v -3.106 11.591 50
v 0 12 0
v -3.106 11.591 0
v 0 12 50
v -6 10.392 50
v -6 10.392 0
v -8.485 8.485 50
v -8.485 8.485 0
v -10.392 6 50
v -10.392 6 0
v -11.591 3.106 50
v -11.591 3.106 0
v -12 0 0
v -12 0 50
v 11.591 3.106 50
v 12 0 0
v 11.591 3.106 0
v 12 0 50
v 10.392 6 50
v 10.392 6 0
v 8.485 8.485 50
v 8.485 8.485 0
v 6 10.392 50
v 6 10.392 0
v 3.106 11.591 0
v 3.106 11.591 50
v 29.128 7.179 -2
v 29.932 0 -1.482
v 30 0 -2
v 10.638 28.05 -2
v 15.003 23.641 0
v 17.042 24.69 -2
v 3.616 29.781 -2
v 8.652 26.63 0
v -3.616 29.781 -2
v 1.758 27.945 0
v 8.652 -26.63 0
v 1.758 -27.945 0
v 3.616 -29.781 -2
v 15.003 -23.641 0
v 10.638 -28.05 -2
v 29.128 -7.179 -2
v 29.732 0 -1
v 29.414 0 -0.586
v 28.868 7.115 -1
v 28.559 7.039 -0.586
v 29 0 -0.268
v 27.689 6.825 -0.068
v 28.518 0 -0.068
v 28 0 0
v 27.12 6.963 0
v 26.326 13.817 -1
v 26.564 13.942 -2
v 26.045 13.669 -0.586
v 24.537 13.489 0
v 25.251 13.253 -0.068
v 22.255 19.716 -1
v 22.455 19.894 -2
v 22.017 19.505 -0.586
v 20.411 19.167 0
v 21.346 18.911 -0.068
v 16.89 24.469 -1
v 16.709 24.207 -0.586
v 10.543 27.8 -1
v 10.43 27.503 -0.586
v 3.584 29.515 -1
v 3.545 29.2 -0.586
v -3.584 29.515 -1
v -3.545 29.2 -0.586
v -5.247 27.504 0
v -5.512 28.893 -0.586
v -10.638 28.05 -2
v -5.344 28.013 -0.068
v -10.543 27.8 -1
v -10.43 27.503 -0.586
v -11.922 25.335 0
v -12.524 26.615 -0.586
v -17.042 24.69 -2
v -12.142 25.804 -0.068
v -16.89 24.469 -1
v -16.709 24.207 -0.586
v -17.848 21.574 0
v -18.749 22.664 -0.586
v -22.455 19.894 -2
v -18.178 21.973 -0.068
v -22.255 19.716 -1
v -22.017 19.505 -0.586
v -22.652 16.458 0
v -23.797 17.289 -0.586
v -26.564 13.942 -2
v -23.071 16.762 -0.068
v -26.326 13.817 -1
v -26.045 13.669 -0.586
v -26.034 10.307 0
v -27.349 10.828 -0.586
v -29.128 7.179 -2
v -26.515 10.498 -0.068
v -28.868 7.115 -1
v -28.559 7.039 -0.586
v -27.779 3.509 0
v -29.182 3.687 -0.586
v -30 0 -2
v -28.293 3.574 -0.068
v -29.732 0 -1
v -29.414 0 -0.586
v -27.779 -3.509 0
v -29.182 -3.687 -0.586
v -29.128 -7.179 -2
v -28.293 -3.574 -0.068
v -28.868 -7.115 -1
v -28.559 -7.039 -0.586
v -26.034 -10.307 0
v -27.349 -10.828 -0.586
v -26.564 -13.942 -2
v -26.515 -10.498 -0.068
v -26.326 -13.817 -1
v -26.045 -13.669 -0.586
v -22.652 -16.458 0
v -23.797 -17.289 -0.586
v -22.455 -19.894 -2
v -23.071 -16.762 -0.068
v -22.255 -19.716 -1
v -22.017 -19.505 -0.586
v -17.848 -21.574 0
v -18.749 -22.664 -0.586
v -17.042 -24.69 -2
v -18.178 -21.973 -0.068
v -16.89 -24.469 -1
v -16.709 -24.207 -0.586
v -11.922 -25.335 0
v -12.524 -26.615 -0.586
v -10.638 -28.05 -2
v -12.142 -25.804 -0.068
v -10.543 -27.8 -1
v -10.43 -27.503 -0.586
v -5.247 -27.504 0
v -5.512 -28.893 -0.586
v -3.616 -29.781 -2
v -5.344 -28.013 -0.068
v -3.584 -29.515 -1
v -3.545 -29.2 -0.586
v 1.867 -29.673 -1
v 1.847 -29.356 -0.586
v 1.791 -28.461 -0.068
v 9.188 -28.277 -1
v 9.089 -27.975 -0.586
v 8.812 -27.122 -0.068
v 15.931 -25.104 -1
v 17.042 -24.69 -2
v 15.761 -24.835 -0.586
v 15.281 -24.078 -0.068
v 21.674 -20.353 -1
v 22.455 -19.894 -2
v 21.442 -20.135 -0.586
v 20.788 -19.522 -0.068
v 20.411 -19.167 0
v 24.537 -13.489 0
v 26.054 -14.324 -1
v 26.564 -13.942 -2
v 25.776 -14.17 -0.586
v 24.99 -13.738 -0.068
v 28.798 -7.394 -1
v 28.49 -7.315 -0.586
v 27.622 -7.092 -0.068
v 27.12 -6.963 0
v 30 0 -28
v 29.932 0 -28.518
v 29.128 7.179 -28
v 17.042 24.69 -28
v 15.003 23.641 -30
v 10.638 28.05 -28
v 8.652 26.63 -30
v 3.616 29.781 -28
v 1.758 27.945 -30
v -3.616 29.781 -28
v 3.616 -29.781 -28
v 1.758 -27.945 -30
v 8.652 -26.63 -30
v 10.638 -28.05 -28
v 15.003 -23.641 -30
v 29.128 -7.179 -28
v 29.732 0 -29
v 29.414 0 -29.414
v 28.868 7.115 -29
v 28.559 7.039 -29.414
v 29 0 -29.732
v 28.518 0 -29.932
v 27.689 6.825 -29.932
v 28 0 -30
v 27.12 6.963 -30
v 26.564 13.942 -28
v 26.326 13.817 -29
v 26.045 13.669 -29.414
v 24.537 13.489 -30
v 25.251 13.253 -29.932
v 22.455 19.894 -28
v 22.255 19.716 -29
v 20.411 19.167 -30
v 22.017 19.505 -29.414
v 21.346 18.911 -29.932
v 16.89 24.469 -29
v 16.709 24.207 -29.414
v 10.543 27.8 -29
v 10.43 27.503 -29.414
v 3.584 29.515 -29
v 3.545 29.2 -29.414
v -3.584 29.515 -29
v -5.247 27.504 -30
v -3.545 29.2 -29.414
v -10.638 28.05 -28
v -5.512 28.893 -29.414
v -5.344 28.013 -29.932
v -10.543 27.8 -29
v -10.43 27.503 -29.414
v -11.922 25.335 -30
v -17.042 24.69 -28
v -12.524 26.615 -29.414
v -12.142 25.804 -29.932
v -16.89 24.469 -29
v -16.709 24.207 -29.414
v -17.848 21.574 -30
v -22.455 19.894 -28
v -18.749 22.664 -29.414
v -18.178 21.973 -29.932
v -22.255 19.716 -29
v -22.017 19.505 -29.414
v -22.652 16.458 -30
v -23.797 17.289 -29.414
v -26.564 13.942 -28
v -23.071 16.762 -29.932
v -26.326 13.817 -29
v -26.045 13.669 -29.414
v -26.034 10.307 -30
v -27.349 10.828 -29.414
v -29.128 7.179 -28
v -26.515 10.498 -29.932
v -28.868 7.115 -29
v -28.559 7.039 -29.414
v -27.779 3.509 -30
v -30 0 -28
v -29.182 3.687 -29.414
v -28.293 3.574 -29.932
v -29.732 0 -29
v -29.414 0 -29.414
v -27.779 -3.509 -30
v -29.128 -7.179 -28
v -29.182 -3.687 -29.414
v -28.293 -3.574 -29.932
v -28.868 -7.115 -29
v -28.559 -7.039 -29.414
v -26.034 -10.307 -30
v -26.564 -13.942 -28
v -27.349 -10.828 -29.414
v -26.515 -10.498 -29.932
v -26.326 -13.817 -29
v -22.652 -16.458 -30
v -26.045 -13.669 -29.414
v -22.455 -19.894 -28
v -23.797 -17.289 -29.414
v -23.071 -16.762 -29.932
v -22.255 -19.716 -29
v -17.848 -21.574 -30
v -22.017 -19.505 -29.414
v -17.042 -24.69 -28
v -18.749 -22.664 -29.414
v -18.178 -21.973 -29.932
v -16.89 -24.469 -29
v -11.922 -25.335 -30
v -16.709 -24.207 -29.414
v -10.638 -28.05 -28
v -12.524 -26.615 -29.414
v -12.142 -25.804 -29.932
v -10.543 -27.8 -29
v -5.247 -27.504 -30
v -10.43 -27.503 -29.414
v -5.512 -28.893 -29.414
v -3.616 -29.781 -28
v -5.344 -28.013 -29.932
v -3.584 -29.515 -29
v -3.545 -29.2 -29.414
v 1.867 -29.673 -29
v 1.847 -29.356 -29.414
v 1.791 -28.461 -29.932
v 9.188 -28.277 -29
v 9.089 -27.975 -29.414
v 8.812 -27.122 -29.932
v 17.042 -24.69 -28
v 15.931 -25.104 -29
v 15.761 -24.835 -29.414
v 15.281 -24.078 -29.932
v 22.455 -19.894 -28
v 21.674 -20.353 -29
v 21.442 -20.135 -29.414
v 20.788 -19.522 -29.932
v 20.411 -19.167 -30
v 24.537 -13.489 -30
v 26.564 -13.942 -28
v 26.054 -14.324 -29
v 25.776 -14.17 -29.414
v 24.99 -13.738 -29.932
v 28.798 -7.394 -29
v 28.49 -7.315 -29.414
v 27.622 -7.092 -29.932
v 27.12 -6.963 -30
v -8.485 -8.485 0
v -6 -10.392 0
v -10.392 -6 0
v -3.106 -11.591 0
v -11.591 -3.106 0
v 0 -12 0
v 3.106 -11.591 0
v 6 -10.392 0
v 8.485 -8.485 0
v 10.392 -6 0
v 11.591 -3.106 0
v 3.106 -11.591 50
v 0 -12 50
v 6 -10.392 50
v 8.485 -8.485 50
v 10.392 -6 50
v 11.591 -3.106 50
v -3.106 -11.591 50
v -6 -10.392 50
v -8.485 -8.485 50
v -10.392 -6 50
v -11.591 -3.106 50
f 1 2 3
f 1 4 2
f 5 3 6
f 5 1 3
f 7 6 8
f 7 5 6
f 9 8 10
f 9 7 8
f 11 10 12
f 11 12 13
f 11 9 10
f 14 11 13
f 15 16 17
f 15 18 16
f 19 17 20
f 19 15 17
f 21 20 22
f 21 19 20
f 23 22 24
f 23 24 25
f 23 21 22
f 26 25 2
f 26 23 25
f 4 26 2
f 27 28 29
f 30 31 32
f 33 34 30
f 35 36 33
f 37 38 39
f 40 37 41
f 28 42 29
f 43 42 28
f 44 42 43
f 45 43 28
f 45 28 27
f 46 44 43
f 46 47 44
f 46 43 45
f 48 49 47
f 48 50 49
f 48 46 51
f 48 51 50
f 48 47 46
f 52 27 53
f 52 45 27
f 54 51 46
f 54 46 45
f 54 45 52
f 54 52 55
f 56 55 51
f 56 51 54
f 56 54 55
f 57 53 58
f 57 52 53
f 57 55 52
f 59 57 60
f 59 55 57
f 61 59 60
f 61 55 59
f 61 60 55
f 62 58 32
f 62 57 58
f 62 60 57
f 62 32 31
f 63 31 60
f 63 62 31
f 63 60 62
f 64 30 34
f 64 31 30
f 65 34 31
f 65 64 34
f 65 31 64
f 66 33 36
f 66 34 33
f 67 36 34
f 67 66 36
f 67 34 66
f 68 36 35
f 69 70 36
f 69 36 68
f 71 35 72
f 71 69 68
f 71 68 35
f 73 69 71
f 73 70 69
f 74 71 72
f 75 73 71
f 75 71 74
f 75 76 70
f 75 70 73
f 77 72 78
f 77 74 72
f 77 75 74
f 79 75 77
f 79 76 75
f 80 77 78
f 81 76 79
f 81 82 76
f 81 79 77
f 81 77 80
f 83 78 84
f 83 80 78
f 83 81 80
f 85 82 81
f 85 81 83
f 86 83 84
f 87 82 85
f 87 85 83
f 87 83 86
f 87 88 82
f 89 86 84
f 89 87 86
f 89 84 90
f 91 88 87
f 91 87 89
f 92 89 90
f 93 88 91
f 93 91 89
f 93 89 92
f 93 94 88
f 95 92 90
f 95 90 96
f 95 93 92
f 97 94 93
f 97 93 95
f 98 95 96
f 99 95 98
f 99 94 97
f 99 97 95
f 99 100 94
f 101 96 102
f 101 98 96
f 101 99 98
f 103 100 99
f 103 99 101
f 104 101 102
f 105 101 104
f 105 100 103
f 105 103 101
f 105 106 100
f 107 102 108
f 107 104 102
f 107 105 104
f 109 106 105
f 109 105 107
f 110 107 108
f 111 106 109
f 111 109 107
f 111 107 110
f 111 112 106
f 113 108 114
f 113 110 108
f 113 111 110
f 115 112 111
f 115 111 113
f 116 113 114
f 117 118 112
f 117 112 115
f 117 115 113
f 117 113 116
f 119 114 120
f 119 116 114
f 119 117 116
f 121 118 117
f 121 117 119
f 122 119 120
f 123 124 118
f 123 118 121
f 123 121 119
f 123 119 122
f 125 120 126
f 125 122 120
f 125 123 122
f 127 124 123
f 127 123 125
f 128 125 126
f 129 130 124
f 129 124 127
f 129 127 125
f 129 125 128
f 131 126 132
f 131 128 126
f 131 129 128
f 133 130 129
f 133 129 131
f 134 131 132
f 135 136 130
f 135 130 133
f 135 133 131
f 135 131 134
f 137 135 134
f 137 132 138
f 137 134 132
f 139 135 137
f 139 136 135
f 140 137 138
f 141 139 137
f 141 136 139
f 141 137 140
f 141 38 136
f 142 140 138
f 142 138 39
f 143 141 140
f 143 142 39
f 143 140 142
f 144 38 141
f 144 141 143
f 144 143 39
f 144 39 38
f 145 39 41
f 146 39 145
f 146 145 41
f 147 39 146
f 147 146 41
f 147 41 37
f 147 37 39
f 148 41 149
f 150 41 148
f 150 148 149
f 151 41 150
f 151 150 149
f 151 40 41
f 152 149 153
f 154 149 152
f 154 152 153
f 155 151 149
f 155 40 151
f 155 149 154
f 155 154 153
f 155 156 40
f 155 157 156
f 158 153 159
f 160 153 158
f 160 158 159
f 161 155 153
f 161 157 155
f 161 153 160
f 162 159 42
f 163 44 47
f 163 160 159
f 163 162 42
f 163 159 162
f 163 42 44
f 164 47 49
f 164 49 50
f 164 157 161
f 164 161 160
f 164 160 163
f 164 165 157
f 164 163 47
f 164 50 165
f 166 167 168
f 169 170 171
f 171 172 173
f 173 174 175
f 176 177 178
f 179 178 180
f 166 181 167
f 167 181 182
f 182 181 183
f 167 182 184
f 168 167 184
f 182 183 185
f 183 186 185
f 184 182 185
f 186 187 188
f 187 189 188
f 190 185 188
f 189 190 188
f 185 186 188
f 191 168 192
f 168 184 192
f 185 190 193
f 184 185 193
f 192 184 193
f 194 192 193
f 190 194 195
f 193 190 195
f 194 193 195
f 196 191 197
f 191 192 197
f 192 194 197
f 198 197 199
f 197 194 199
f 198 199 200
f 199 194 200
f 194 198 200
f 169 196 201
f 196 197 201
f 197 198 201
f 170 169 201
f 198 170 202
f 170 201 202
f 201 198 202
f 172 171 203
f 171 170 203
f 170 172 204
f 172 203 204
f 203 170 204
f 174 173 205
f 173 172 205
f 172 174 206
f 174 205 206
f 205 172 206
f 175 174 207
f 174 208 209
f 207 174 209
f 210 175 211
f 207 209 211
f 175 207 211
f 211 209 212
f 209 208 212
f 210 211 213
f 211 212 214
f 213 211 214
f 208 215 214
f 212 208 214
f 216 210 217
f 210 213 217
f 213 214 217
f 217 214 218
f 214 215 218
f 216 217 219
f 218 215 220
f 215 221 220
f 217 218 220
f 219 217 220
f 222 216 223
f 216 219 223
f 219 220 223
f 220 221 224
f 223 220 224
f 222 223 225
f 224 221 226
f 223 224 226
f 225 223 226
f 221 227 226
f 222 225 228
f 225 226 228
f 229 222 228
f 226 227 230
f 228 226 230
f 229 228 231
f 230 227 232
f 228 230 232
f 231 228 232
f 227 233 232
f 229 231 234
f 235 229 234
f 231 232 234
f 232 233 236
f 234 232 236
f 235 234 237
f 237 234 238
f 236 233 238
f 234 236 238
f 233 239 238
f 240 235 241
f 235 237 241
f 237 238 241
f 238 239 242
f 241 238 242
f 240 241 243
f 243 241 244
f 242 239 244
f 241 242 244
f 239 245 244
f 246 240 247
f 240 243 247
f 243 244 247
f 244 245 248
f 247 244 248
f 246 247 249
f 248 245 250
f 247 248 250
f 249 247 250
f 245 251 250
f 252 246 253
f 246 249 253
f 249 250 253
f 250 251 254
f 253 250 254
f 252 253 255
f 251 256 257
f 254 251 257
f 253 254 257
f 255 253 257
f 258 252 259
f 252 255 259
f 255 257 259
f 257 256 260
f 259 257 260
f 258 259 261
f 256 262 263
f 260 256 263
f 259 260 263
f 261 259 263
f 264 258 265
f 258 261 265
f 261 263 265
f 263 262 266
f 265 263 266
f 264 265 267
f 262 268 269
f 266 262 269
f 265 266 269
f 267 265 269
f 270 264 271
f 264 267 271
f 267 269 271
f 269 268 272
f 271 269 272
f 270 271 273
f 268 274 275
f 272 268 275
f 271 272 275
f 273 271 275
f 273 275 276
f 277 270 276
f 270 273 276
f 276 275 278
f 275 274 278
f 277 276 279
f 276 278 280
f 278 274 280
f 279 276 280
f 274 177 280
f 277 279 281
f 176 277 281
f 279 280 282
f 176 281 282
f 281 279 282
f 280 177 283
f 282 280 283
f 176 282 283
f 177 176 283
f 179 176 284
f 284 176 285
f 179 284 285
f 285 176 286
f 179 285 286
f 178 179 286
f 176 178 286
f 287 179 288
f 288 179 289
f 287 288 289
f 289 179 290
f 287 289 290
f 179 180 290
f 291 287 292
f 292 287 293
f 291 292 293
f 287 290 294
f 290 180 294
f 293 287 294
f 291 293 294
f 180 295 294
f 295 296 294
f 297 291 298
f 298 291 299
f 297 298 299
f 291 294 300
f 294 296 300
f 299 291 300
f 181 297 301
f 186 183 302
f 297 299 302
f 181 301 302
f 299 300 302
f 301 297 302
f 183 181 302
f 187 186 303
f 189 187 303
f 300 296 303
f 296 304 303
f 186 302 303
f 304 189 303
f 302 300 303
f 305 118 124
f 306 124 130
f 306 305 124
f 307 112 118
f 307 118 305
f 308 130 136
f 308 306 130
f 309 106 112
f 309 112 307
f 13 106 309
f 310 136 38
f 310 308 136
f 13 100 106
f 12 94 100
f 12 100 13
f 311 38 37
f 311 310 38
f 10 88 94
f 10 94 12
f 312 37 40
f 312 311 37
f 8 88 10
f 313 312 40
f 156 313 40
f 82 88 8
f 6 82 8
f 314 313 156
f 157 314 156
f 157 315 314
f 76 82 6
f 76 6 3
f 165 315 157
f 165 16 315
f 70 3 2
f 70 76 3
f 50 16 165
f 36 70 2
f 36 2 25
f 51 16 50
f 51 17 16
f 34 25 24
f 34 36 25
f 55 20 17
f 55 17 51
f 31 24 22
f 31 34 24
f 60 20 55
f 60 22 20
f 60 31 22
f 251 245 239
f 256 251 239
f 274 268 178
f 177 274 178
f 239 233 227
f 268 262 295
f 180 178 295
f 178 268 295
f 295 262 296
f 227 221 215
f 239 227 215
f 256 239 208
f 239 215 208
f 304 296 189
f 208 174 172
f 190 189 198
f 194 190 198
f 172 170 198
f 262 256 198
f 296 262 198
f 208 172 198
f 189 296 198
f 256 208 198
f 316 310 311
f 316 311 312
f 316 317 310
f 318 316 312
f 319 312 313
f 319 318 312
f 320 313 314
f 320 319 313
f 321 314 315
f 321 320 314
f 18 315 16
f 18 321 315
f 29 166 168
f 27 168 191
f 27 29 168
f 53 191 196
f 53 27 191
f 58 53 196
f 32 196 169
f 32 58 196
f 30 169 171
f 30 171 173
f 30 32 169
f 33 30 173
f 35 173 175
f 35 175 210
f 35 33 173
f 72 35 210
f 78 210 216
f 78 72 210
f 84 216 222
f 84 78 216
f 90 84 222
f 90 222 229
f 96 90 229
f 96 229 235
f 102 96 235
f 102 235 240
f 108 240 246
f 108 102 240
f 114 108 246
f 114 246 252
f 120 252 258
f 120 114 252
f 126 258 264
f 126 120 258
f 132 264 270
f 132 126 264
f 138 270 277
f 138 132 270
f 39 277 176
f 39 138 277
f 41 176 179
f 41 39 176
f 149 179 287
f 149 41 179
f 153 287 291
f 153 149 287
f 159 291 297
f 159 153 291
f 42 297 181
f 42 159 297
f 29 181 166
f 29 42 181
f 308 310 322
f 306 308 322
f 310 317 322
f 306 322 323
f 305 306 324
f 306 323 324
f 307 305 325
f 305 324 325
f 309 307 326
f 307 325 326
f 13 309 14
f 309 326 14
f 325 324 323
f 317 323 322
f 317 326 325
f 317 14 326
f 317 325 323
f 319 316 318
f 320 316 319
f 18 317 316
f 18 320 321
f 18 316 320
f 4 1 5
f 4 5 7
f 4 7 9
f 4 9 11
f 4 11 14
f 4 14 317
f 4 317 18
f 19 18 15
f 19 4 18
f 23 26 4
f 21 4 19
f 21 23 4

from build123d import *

# Parameters (mm, degrees)
ESQUISSE1_W        = 24
ESQUISSE1_H        = 24
BOSS_EXTRU_1_DEPTH = 50
ESQUISSE2_R        = 2.5
BOSS_EXTRU_3_DEPTH = 30
ESQUISSE3_R        = 30
BOSS_EXTRU_4_DEPTH = 30
CONG_1_R           = 2
CONG_2_R           = 2
CONG_3_R           = 12


with BuildPart() as part:
    # Esquisse1 → Boss.-Extru.1 (new body)
    with BuildSketch(Plane.XY):
        Rectangle(ESQUISSE1_W, ESQUISSE1_H)
    extrude(amount=BOSS_EXTRU_1_DEPTH)

    # Esquisse2 → Boss.-Extru.3 (add)
    with BuildSketch(Plane.XY):
        Circle(ESQUISSE2_R)
    extrude(amount=-BOSS_EXTRU_3_DEPTH)

    # Esquisse3 → Boss.-Extru.4 (add)
    with BuildSketch(Plane.XY):
        Circle(ESQUISSE3_R)
    extrude(amount=-BOSS_EXTRU_4_DEPTH)

    # Congé1
    cong_1_edges = [part.edges().sort_by_distance(p)[0] for p in [
        (-30, 0, -30),
    ]]
    fillet(cong_1_edges, radius=CONG_1_R)

    # Congé2
    cong_2_edges = [part.edges().sort_by_distance(p)[0] for p in [
        (-30, 0, 0),
    ]]
    fillet(cong_2_edges, radius=CONG_2_R)

    # Congé3
    cong_3_edges = [part.edges().sort_by_distance(p)[0] for p in [
        (-12, 12, 25),
        (12, 12, 25),
        (12, -12, 25),
        (-12, -12, 25),
    ]]
    fillet(cong_3_edges, radius=CONG_3_R - 0.0001)  # a hair under: the kernel refuses the full size


solid = part.part
